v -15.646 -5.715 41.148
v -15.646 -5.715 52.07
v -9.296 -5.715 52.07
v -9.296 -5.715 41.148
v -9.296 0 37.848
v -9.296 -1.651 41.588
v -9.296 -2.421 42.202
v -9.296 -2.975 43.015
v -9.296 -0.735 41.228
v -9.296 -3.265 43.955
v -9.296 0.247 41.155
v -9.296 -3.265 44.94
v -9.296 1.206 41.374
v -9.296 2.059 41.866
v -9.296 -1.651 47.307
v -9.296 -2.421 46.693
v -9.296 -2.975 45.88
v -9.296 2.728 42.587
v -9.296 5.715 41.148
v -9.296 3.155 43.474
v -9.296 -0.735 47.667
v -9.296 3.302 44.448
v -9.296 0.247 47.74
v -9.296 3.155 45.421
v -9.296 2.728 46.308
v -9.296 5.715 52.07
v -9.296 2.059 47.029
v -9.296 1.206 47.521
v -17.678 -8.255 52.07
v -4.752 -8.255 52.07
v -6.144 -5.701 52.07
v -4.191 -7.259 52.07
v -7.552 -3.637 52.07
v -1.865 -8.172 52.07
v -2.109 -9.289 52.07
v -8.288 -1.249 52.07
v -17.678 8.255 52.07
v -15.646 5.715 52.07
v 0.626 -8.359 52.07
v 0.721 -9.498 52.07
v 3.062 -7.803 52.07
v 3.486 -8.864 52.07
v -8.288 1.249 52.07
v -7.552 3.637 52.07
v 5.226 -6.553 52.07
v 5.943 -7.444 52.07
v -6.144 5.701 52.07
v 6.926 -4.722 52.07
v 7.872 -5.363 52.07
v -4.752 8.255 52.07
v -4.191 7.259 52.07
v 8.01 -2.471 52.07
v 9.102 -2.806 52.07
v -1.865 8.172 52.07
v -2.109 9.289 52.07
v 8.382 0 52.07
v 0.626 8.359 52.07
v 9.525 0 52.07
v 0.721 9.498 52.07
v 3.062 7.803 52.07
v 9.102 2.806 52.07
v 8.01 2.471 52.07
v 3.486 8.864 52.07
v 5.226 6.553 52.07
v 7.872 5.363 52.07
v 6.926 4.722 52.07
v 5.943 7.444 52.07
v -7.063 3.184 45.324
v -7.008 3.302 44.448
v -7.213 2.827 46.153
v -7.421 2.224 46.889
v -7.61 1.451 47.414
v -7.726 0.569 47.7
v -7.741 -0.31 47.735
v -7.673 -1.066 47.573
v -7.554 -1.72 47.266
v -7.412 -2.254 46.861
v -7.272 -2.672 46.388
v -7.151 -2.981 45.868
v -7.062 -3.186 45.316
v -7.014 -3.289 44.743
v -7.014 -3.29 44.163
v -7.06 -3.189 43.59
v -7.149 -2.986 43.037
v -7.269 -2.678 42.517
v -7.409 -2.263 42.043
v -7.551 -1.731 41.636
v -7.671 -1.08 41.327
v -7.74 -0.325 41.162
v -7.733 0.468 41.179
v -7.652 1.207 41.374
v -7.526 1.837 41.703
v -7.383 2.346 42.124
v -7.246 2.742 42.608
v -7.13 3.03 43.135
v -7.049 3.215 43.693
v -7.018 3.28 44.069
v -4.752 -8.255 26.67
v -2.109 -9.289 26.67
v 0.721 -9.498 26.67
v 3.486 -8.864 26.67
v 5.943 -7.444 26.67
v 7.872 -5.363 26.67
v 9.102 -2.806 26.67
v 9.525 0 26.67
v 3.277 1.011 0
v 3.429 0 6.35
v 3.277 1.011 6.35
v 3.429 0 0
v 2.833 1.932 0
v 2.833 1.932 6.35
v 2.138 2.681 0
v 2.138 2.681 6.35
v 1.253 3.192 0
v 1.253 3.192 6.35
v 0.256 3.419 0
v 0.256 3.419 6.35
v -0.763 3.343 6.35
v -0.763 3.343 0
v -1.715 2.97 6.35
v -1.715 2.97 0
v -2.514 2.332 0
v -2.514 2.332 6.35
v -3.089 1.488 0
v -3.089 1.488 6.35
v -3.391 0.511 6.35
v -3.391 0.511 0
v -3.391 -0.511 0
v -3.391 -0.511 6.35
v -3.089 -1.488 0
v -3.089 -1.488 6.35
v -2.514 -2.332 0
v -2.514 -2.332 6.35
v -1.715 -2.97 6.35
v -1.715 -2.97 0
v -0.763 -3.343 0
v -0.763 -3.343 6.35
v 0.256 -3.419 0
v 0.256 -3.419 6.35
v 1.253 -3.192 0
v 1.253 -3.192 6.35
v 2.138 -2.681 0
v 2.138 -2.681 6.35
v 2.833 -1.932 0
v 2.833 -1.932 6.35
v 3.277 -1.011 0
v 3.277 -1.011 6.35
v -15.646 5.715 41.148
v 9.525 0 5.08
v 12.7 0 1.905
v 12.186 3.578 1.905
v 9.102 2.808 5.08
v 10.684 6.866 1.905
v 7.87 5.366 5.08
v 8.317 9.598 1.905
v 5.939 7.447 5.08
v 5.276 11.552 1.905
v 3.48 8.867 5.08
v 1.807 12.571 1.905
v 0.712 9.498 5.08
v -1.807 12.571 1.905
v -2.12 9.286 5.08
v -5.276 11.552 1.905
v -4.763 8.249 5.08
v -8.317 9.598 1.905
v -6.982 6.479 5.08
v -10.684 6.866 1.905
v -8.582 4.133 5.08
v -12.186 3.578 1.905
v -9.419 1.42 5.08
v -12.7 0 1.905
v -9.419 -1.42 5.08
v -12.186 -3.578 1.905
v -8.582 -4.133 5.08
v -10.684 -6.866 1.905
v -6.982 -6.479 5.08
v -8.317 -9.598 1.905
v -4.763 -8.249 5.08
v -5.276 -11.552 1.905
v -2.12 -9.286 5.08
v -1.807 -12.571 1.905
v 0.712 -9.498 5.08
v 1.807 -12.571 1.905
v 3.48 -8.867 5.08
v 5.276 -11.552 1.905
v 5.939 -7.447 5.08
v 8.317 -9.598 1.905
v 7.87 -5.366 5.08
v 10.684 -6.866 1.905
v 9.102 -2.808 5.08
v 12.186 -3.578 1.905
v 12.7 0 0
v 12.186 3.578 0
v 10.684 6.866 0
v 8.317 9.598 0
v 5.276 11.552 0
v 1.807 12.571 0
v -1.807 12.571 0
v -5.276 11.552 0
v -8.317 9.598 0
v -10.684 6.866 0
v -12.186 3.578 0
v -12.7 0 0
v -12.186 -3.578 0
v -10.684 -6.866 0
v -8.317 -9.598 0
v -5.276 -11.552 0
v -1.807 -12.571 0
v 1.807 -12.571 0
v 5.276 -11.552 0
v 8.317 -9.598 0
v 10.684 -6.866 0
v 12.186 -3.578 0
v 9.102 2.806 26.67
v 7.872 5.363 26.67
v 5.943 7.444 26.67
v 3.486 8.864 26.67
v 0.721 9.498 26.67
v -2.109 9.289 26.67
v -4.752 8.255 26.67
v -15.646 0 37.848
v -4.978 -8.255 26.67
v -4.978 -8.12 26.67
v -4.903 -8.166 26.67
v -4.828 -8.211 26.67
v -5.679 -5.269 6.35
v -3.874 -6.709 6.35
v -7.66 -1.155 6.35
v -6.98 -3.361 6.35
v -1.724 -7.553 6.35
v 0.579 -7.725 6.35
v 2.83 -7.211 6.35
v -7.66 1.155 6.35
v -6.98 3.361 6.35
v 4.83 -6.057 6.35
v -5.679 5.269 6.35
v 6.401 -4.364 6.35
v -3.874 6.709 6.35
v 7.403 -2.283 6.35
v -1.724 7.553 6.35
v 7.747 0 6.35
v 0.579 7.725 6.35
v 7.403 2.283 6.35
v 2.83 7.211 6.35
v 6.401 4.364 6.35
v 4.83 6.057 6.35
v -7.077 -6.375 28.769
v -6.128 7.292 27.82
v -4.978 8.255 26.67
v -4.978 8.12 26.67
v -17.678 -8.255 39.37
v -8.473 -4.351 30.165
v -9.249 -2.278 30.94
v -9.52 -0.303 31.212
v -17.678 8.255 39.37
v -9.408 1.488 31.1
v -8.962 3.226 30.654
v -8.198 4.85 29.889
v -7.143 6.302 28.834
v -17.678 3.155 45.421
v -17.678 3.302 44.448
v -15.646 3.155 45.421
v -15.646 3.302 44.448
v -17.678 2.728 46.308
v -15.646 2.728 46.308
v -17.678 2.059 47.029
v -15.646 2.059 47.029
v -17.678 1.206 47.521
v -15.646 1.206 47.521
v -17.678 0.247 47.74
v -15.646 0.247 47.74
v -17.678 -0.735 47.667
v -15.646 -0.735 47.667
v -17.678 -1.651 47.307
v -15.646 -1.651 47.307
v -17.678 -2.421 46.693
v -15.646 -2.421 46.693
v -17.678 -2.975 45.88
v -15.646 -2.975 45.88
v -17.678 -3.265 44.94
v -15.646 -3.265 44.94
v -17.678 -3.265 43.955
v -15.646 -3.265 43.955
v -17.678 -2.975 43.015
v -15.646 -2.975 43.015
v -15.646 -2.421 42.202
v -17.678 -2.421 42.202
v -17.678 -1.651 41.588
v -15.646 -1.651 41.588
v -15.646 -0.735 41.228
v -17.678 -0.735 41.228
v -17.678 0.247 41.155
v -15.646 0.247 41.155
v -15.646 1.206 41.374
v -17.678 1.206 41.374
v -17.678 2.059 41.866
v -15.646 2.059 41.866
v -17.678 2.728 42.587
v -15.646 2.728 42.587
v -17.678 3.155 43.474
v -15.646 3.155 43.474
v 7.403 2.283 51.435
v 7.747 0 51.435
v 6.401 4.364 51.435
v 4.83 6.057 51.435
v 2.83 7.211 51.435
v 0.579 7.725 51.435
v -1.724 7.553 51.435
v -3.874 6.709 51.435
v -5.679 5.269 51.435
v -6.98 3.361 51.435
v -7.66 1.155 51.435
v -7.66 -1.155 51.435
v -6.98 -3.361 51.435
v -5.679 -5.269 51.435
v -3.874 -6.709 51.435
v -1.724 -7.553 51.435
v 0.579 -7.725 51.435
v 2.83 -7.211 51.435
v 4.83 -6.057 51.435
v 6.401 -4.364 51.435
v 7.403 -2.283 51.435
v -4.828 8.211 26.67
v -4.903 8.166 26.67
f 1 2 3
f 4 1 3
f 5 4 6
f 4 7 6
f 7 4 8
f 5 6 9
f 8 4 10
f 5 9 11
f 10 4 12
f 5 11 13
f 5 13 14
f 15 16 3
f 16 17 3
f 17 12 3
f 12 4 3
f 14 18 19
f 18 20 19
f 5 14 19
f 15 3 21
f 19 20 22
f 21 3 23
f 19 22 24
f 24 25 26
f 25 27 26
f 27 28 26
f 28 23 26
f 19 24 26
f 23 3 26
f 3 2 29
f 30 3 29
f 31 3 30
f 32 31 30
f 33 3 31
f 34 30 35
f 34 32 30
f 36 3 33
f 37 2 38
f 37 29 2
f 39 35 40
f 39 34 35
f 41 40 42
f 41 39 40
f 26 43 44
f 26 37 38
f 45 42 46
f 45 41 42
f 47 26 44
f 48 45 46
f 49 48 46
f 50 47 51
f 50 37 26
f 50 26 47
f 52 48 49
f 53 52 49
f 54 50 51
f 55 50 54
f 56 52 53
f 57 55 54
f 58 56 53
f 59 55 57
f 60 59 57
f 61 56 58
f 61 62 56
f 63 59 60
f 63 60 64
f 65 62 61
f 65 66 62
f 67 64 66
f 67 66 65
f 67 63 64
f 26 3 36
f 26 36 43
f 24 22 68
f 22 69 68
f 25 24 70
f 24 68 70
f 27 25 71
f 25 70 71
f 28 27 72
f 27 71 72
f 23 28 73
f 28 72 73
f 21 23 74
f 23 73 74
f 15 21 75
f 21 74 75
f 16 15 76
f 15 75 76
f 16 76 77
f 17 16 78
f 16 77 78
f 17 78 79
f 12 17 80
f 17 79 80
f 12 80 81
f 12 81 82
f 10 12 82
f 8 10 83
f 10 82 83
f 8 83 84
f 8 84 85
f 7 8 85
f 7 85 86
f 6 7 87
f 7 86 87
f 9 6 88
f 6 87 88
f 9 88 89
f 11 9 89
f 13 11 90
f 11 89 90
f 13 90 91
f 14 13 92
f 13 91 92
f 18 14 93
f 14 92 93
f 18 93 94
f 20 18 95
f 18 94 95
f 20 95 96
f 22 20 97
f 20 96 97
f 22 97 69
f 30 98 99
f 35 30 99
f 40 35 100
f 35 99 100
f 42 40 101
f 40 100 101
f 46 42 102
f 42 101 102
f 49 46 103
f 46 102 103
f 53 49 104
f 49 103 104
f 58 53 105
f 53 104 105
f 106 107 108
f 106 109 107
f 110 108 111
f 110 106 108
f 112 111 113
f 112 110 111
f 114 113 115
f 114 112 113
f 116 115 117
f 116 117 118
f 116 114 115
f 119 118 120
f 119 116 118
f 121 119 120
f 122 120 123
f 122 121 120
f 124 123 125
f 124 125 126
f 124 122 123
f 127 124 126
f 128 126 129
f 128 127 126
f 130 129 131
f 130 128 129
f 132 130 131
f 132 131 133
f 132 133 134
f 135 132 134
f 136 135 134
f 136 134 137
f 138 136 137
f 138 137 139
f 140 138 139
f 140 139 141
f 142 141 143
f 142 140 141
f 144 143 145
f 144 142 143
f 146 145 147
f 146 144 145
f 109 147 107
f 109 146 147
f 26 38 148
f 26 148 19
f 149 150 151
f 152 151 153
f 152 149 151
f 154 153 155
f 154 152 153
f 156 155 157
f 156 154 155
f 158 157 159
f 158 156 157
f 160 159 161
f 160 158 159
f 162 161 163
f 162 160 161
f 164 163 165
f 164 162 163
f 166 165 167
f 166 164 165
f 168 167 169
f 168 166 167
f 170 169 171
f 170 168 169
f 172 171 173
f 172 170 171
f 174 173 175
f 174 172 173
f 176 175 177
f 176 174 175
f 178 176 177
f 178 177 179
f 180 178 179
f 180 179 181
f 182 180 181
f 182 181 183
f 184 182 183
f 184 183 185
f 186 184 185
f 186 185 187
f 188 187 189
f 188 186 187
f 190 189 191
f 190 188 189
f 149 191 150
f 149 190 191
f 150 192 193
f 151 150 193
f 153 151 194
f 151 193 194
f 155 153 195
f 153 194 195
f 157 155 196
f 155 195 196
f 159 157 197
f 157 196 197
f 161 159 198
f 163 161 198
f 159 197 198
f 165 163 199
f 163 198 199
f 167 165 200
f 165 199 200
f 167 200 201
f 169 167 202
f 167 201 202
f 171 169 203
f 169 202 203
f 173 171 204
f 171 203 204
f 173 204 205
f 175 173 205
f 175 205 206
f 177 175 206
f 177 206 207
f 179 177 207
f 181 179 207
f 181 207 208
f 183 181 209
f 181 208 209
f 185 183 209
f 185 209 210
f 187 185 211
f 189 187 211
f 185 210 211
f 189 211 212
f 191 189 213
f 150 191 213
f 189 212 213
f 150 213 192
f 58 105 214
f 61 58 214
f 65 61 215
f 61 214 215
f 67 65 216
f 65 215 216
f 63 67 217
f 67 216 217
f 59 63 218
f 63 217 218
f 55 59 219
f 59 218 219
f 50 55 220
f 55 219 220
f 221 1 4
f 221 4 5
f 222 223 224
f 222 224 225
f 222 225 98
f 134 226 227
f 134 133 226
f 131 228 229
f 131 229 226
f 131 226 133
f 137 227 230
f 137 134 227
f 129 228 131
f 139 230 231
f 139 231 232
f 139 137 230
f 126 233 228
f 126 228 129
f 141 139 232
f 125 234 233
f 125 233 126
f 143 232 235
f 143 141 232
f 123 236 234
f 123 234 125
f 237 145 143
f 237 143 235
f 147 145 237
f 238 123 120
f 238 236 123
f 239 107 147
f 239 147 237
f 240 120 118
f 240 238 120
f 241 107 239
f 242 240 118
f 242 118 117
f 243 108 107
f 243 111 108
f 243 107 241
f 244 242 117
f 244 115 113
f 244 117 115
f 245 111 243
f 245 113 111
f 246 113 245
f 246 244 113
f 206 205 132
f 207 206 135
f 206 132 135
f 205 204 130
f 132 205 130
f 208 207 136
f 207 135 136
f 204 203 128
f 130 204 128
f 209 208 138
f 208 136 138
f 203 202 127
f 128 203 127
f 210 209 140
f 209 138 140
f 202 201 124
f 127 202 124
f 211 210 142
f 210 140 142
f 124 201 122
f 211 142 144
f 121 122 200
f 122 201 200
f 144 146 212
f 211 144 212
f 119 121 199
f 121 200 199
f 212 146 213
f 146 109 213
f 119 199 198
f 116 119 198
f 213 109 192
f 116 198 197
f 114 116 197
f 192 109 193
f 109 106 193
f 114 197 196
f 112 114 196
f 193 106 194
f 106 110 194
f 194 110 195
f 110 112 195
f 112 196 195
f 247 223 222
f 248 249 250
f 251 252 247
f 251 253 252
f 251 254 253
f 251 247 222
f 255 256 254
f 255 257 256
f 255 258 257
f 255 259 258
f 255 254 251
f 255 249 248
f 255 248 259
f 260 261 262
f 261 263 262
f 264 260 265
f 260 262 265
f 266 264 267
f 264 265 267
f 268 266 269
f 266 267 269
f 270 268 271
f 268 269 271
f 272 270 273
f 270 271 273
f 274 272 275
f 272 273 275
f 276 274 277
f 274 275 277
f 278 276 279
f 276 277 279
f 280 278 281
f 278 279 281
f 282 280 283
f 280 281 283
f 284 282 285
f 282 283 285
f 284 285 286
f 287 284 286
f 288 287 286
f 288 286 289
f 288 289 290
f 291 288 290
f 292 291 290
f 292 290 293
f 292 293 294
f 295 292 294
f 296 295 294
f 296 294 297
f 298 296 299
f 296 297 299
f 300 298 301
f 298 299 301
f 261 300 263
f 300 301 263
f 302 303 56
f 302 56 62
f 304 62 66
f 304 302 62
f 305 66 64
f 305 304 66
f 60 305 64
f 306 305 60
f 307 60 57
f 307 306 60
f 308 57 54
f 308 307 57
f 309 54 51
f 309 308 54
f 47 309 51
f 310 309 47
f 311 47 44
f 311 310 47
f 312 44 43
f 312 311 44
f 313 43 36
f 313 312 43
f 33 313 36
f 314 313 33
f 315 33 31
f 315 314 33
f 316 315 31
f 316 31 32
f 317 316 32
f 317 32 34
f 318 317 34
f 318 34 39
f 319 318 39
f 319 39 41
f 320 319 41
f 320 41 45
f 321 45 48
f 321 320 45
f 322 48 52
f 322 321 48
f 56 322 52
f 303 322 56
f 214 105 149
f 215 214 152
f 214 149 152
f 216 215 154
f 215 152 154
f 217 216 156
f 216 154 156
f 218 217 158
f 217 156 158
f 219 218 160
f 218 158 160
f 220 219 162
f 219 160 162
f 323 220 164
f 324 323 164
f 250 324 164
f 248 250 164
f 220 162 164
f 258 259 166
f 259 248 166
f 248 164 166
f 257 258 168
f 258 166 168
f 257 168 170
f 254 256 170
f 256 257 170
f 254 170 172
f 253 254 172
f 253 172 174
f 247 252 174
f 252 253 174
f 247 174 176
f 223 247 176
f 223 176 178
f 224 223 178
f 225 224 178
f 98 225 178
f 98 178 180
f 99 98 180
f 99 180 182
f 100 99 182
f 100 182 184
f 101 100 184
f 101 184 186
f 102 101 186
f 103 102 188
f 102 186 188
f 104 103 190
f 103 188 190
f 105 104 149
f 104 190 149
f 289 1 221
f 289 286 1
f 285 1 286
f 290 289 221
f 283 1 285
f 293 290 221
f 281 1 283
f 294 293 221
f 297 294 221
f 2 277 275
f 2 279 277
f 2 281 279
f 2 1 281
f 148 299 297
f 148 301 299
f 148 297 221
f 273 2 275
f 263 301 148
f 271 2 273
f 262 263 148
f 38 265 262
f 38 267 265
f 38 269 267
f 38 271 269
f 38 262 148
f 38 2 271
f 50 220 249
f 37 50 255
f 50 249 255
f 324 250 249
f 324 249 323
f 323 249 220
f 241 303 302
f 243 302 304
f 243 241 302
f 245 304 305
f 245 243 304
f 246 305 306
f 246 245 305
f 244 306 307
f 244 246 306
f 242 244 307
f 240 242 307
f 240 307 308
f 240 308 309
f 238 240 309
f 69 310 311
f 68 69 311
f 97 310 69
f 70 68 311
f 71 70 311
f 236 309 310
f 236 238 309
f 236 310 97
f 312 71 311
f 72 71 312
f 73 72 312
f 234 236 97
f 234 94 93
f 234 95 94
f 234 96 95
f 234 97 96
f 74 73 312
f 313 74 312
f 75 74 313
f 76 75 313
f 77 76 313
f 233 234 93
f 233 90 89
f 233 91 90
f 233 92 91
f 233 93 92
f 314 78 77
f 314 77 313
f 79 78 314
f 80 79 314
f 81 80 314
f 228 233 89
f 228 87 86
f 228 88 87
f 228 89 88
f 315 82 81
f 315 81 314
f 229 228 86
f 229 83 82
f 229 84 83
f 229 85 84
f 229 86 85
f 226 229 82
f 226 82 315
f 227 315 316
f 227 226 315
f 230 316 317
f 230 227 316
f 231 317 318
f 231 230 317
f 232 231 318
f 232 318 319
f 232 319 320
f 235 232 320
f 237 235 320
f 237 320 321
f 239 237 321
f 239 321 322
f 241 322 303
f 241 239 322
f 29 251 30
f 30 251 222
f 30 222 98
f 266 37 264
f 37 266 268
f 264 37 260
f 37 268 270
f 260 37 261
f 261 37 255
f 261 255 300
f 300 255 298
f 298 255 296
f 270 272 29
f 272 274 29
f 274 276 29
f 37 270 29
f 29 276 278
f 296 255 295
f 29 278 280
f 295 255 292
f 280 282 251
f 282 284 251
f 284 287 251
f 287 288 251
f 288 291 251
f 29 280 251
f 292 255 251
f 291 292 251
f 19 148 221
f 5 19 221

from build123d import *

# Parameters (mm, degrees)
F0_R         = 12.7
F0_R_2       = 3.429
F1_DEPTH     = 5.08
F2_SIZE      = 3.175
F3_DEPTH     = 1.27
F4_R         = 9.525
F4_R_2       = 7.747
F5_DEPTH     = 20.32
F6_R         = 7.747
F7_DEPTH     = 25.4
F8_T4_DEPTH  = 81.8307478943
F8_S5_R      = 9.525
F8_T6_DEPTH  = 43
F9_W         = 6.35
F9_H         = 11.43
F10_DEPTH    = 14.224
F11_T1_DEPTH = 6.35
F12_R        = 3.302
F13_DEPTH    = 12.7
F14_SIZE     = 0.635


# Not quite as in the source:
# - a fillet or chamfer that OpenCascade refuses, or shapes differently, is made with other operations: its cross-section is extruded or revolved along the edge and cut away or added


with BuildPart() as f1:
    # F0 (on Top) → F1 (new body)
    with BuildSketch(Plane.XY):
        Circle(F0_R)
        Circle(F0_R_2, mode=Mode.SUBTRACT)
    extrude(amount=F1_DEPTH)

    # F2
    f2_edges = [f1.edges().sort_by_distance(p)[0] for p in [
        (-12.7, 0, 5.08),
    ]]
    chamfer(f2_edges, length=F2_SIZE)

    # F3 (add): a face of the model
    f3_faces = [f1.faces().sort_by_distance(p)[0] for p in [
        (-9.2555923164, 0, 5.08),
    ]]
    extrude(f3_faces, amount=F3_DEPTH)

    # F4 (on face) → F5 (join)
    with BuildSketch(Plane.XY.offset(6.35)):
        Circle(F4_R)
        Circle(F4_R_2, mode=Mode.SUBTRACT)
    extrude(amount=F5_DEPTH)

    # F6 (on face) → F7 (join)
    with BuildSketch(Plane.XY.offset(26.67)):
        with BuildLine():
            ThreePointArc((9.525, 0), (4.7677946163, 8.2458328565), (-4.7519048812, 8.255))
            ThreePointArc((-4.7519048812, 8.255), (-9.525, 0), (-4.7519048812, -8.255))
            ThreePointArc((-4.7519048812, -8.255), (4.7677946163, -8.2458328565), (9.525, 0))
        make_face()
        Circle(F6_R, mode=Mode.SUBTRACT)
        with BuildLine():
            ThreePointArc((-4.7519048812, -8.255), (-9.525, 0), (-4.7519048812, 8.255))
            Line((-4.7519048812, 8.255), (-17.6784, 8.255))
            Line((-17.6784, 8.255), (-17.6784, -8.255))
            Line((-17.6784, -8.255), (-4.7519048812, -8.255))
        make_face()
    extrude(amount=F7_DEPTH)

    # F8: chamfer of 12.7 on 1 edges, made by hand


with BuildPart() as f8_tool2:
    # F8_s3 → F8_t4 (new body)
    with BuildSketch(Plane.XZ.offset(-40.9153739472)):
        Polygon((-4.9784, 26.67), (-17.6784, 39.37), (-17.6784, 26.67), align=None)
    extrude(amount=F8_T4_DEPTH)

    # F8_s5 → F8_t6 (cut, symmetric)
    with BuildSketch(Plane.XY.offset(33)):
        Circle(F8_S5_R)
    extrude(amount=F8_T6_DEPTH, both=True, mode=Mode.SUBTRACT)


with BuildPart() as f1_1:
    add(f1.part)

    # F8_t1: cut F8_tool2
    add(f8_tool2.part, mode=Mode.SUBTRACT)

    # F9 (on face) → F10 (cut)
    with BuildSketch(Plane.XY.offset(52.07)):
        with Locations((-12.4714, 0)):
            Rectangle(F9_W, F9_H)
    extrude(amount=-F10_DEPTH, mode=Mode.SUBTRACT)

    # F11: chamfer of 3.302 x 5.7192317666 on 2 edges, made by hand

    # F11_s2 → F11_t1 (join)
    with BuildSketch(Plane.YZ.offset(-15.6464)):
        Polygon((5.715, 41.148), (-0.0042317666, 37.846), (5.715, 37.846), align=None)
        Polygon((-5.715, 41.148), (0.0042317666, 37.846), (-5.715, 37.846), align=None)
    extrude(amount=F11_T1_DEPTH)

    # F12 (on face) → F13 (cut, symmetric)
    with BuildSketch(Plane.YZ.offset(-15.6464)):
        with Locations((0, 44.4475567884)):
            Circle(F12_R)
    extrude(amount=F13_DEPTH, both=True, mode=Mode.SUBTRACT)

    # F14
    f14_edges = [f1_1.edges().sort_by_distance(p)[0] for p in [
        (-7.747, 0, 52.07),
    ]]
    chamfer(f14_edges, length=F14_SIZE)


solid = f1_1.part
